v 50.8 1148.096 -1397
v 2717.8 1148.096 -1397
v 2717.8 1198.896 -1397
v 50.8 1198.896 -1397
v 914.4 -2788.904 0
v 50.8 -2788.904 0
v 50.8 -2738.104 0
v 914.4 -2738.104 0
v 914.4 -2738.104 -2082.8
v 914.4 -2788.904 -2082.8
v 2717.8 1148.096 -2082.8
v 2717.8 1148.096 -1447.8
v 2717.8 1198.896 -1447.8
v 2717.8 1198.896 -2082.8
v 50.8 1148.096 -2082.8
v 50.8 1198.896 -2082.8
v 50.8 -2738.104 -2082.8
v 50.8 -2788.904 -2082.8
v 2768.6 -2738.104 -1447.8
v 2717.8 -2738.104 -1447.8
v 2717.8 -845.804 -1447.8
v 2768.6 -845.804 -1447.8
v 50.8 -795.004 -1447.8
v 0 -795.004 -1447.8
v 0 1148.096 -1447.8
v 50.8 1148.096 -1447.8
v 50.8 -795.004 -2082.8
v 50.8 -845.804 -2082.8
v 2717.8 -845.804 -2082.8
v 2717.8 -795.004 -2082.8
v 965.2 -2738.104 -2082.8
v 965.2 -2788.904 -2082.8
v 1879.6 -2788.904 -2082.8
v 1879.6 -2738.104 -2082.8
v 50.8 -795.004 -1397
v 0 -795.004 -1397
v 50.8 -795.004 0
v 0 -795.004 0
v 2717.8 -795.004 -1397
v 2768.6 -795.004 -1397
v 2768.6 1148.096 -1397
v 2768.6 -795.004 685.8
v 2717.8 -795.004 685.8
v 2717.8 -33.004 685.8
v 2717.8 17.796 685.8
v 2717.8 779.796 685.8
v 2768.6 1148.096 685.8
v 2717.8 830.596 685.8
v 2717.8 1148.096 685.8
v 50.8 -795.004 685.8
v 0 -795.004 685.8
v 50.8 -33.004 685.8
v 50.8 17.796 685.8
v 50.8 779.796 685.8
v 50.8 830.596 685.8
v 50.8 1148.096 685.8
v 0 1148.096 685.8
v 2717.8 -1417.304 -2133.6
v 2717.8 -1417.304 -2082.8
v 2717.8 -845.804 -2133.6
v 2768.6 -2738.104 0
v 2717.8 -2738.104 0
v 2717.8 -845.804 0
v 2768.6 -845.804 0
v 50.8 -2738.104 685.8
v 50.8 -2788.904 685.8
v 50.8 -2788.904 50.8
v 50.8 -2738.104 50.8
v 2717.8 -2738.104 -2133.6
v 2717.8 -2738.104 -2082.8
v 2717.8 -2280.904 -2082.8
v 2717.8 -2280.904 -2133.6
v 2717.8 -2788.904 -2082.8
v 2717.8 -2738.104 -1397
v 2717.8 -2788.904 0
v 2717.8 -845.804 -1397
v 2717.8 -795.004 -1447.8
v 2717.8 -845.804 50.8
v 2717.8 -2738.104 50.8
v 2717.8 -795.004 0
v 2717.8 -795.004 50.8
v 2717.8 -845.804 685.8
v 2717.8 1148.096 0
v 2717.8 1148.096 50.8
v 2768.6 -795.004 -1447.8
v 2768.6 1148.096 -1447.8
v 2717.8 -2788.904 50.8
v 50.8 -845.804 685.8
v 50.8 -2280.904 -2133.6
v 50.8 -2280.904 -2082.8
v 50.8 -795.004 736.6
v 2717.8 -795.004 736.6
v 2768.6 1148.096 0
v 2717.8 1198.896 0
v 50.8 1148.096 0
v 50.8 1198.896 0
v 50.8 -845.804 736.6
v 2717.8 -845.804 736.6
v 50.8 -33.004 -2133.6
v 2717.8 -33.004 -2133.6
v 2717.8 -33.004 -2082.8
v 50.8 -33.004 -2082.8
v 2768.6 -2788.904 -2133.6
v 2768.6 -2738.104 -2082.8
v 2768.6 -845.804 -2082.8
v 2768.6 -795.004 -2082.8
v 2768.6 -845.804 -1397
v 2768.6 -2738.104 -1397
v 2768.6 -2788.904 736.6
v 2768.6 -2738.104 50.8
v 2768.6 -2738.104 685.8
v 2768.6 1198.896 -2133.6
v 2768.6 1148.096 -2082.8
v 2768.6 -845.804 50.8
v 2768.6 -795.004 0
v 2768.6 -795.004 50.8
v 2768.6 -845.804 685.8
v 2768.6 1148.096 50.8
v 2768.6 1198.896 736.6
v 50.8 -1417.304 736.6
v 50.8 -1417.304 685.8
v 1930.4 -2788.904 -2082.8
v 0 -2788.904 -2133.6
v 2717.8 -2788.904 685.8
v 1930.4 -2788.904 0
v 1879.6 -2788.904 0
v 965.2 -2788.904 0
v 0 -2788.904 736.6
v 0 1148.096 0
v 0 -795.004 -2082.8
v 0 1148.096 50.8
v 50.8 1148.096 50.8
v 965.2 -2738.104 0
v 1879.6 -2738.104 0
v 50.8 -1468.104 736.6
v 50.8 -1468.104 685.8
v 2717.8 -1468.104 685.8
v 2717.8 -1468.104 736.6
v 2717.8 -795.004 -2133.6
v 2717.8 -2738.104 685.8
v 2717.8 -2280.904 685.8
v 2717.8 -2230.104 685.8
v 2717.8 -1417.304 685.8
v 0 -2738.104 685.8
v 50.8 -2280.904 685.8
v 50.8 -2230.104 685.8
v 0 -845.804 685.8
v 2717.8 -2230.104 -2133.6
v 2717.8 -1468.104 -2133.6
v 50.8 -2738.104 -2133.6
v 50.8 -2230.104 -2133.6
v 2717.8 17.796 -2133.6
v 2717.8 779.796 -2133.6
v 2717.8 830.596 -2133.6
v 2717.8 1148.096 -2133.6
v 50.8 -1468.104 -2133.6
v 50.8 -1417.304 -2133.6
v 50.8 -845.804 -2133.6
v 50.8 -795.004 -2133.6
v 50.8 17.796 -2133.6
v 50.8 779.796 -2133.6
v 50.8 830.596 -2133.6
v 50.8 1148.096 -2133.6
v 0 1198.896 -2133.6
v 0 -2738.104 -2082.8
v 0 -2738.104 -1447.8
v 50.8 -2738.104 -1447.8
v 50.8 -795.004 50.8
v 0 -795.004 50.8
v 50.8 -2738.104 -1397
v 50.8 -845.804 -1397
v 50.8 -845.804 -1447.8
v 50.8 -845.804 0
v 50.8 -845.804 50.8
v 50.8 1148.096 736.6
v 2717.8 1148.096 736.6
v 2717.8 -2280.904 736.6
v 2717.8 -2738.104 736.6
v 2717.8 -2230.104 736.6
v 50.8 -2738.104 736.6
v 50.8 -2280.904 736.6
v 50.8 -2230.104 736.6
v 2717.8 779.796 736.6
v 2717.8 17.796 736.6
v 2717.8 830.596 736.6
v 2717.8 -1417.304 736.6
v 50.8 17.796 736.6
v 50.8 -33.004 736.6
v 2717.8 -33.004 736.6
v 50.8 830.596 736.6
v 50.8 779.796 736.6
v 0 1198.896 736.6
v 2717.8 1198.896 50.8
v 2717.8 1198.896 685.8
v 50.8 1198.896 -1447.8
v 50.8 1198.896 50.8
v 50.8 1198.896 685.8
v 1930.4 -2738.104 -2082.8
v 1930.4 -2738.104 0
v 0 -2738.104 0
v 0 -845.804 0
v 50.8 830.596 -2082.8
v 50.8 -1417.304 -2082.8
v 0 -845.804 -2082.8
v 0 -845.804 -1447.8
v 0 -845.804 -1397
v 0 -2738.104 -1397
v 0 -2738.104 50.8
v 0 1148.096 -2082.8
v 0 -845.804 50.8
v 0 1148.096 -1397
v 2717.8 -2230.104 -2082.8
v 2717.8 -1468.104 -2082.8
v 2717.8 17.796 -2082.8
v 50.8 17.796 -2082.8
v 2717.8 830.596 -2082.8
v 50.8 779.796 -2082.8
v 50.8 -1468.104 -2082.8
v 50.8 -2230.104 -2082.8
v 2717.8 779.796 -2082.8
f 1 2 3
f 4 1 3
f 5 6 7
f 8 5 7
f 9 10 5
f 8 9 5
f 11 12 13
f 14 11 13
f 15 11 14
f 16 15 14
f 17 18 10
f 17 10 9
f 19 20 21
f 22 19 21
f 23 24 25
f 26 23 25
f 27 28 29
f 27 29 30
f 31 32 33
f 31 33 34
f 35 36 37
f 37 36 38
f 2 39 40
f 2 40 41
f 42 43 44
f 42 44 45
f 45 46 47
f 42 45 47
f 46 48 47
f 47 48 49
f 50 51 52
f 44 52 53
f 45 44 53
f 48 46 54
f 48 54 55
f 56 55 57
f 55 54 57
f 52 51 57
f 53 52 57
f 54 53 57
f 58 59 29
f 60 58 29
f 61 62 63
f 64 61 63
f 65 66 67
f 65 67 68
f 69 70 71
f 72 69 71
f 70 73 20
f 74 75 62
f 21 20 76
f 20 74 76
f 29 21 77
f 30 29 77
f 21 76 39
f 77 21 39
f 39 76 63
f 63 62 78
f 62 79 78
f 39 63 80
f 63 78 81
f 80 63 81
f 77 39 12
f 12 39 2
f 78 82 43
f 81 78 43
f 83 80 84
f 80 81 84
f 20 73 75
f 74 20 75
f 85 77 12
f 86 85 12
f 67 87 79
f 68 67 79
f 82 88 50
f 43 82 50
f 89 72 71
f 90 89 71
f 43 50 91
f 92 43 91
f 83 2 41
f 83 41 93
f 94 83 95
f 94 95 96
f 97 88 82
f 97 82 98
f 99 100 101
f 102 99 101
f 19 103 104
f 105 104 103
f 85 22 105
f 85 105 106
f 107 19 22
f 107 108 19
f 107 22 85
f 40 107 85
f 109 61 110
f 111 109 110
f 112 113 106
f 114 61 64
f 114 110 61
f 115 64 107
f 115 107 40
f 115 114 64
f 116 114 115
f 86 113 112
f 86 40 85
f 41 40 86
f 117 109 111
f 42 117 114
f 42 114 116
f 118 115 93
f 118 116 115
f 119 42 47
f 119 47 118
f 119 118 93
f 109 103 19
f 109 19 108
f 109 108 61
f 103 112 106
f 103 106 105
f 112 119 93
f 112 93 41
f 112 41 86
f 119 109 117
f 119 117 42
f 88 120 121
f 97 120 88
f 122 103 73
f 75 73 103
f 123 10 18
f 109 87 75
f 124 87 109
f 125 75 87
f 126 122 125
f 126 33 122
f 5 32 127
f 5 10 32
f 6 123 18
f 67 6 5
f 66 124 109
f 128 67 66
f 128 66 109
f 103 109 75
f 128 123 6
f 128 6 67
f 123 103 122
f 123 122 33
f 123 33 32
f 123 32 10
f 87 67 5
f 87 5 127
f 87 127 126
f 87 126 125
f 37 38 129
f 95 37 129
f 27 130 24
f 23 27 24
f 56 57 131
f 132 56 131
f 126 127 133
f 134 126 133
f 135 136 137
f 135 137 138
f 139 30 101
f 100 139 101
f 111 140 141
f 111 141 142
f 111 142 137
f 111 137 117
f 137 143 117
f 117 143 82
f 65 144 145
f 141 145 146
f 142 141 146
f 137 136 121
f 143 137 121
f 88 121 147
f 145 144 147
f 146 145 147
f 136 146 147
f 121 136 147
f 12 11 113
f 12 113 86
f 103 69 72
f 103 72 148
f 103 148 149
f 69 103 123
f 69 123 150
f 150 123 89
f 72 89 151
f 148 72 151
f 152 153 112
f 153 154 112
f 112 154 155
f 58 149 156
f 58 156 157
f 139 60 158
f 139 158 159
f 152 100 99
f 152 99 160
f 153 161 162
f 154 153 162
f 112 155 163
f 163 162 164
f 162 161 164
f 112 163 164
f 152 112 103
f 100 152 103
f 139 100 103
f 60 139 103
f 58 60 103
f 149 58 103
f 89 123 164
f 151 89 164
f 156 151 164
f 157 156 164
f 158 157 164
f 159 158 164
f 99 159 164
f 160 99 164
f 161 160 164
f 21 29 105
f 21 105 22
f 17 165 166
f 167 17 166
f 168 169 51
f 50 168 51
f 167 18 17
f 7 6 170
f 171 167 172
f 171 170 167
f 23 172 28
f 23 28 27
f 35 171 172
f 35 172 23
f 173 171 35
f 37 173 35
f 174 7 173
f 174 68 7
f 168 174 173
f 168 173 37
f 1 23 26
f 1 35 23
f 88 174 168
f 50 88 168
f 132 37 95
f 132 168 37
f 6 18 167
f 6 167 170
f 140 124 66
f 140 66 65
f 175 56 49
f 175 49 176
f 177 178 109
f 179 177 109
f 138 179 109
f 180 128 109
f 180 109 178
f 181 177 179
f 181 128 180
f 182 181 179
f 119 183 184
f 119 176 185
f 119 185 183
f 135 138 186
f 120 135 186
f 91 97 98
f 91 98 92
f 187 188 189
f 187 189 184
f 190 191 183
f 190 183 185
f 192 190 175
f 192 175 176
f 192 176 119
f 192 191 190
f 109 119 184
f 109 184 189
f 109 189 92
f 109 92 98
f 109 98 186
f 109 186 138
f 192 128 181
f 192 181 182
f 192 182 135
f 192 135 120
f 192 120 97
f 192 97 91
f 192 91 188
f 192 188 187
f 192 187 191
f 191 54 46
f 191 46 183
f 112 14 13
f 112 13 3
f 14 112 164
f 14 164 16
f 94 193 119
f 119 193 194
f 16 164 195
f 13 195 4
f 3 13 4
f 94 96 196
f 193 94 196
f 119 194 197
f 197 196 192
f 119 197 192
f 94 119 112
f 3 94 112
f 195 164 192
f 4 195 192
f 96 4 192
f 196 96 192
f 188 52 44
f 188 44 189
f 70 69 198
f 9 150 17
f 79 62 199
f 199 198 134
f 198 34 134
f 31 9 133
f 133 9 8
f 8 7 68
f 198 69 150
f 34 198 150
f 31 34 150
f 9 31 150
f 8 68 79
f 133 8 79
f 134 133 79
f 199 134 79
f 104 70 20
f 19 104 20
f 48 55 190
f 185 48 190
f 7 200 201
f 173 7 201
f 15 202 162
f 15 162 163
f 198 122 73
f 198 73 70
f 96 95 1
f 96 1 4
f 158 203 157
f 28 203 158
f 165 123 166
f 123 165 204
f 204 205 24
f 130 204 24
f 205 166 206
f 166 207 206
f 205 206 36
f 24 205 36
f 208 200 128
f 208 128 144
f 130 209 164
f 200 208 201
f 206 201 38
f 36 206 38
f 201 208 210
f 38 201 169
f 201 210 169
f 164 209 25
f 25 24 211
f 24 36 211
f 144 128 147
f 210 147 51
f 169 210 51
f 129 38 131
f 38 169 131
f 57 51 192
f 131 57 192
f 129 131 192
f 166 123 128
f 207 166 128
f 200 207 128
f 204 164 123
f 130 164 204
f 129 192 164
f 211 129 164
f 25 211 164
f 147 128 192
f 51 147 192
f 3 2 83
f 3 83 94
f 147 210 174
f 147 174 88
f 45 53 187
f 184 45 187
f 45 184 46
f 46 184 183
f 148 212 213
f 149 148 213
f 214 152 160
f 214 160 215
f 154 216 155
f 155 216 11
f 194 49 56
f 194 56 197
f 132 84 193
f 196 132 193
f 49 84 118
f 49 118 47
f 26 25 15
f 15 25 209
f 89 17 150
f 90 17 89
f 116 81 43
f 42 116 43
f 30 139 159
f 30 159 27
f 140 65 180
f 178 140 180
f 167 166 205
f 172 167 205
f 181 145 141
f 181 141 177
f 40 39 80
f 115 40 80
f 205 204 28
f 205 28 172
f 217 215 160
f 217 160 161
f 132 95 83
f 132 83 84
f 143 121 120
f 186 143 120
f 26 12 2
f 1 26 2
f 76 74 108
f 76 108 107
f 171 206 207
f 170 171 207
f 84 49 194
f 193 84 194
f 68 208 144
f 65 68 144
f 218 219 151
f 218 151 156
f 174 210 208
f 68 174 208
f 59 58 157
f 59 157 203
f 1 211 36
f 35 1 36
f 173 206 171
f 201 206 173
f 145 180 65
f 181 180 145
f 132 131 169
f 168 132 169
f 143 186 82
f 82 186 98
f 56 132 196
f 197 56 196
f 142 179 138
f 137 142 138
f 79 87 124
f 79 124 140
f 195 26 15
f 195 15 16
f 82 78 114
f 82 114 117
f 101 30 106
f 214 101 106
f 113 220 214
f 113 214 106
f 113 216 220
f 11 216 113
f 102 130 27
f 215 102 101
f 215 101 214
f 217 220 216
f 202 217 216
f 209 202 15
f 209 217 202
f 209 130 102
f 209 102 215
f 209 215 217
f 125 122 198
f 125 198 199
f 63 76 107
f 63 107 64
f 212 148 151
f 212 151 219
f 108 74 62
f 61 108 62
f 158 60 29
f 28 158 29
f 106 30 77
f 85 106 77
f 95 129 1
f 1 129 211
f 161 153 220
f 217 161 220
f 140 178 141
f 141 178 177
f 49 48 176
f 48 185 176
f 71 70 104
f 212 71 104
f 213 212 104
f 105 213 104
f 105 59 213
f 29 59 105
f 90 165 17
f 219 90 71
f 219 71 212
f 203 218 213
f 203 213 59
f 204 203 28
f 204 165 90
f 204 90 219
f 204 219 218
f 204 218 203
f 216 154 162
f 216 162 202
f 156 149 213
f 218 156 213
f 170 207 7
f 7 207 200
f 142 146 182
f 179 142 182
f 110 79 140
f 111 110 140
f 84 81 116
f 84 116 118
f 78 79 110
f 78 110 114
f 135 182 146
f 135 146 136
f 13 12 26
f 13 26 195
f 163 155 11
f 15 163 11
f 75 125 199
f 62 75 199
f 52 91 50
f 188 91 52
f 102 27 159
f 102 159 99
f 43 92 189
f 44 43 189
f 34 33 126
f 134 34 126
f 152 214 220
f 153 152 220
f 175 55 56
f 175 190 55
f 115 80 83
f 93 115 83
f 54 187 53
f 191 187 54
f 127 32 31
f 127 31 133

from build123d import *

# Parameters (mm, degrees)
F0_W     = 50.8
F0_H     = 635
F0_H_2   = 1397
F1_DEPTH = 50.8
F2_W     = 50.8
F2_H     = 50.8
F3_DEPTH = 2667
F4_W     = 50.8
F4_H     = 2082.8
F5_DEPTH = 50.8
F6_W     = 3987.8
F6_H     = 2870.2
F6_W_2   = 1892.3
F6_H_2   = 635
F6_H_3   = 1397
F6_W_3   = 1943.1
F7_DEPTH = 50.8


with BuildPart() as f1:
    # F0 (on Right) → F1 (new body)
    with BuildSketch(Plane.YZ):
        Polygon((-2738.104361, 736.6), (-2788.904361, 736.6), (-2788.904361, -2133.6), (-2738.104361, -2133.6), (-2738.104361, -2082.8), (-2738.104361, -1447.8), (-2738.104361, -1397), (-2738.104361, 0), (-2738.104361, 50.8), (-2738.104361, 685.8), align=None)
        Polygon((1148.095639, 736.6), (-2738.104361, 736.6), (-2738.104361, 685.8), (-845.804361, 685.8), (-795.004361, 685.8), (1148.095639, 685.8), align=None)
        Polygon((1198.895639, 736.6), (1148.095639, 736.6), (1148.095639, 685.8), (1148.095639, 50.8), (1148.095639, 0), (1148.095639, -1397), (1148.095639, -1447.8), (1148.095639, -2082.8), (1148.095639, -2133.6), (1198.895639, -2133.6), align=None)
        Polygon((-2738.104361, -2082.8), (-2738.104361, -2133.6), (1148.095639, -2133.6), (1148.095639, -2082.8), (-795.004361, -2082.8), (-845.804361, -2082.8), align=None)
        Polygon((-845.804361, 50.8), (-2738.104361, 50.8), (-2738.104361, 0), (-845.804361, 0), (-795.004361, 0), (1148.095639, 0), (1148.095639, 50.8), (-795.004361, 50.8), align=None)
        with Locations((-820.404361, 368.3)):
            Rectangle(F0_W, F0_H)
        with Locations((-820.404361, -698.5)):
            Rectangle(F0_W, F0_H_2)
        with Locations((-820.404361, -1765.3)):
            Rectangle(F0_W, F0_H)
        Polygon((-2738.104361, -1397), (-2738.104361, -1447.8), (-845.804361, -1447.8), (-795.004361, -1447.8), (1148.095639, -1447.8), (1148.095639, -1397), (-795.004361, -1397), (-845.804361, -1397), align=None)
    extrude(amount=F1_DEPTH)

    # F2 (on face) → F3 (join)
    with BuildSketch(Plane.YZ.offset(50.8)):
        with Locations((-2763.504361, 711.2)):
            Rectangle(F2_W, F2_H)
        with Locations((-2763.504361, 25.4)):
            Rectangle(F2_W, F2_H)
        with Locations((-2763.504361, -2108.2)):
            Rectangle(F2_W, F2_H)
        with Locations((-820.404361, -2108.2)):
            Rectangle(F2_W, F2_H)
        with Locations((1173.495639, -2108.2)):
            Rectangle(F2_W, F2_H)
        with Locations((1173.495639, -1422.4)):
            Rectangle(F2_W, F2_H)
        with Locations((1173.495639, 25.4)):
            Rectangle(F2_W, F2_H)
        with Locations((1173.495639, 711.2)):
            Rectangle(F2_W, F2_H)
        with Locations((-820.404361, 711.2)):
            Rectangle(F2_W, F2_H)
        with Locations((-2255.504361, -2108.2)):
            Rectangle(F2_W, F2_H)
        with Locations((-1442.704361, -2108.2)):
            Rectangle(F2_W, F2_H)
        with Locations((-7.604361, -2108.2)):
            Rectangle(F2_W, F2_H)
        with Locations((805.195639, -2108.2)):
            Rectangle(F2_W, F2_H)
        with Locations((805.195639, 711.2)):
            Rectangle(F2_W, F2_H)
        with Locations((-7.604361, 711.2)):
            Rectangle(F2_W, F2_H)
        with Locations((-1442.704361, 711.2)):
            Rectangle(F2_W, F2_H)
        with Locations((-2255.504361, 711.2)):
            Rectangle(F2_W, F2_H)
    extrude(amount=F3_DEPTH)

    # F4 (on face) → F5 (join)
    with BuildSketch(Plane.XZ.offset(2788.904361)):
        with Locations((939.8, -1041.4)):
            Rectangle(F4_W, F4_H)
        with Locations((1905, -1041.4)):
            Rectangle(F4_W, F4_H)
    extrude(amount=-F5_DEPTH)

    # F6 (on face) → F7 (join)
    with BuildSketch(Plane.YZ.offset(2717.8)):
        with Locations((-795.004361, -698.5)):
            Rectangle(F6_W, F6_H)
        with Locations((-1791.954361, -1765.3)):
            Rectangle(F6_W_2, F6_H_2, mode=Mode.SUBTRACT)
        with Locations((-1791.954361, -698.5)):
            Rectangle(F6_W_2, F6_H_3, mode=Mode.SUBTRACT)
        with Locations((176.545639, -1765.3)):
            Rectangle(F6_W_3, F6_H_2, mode=Mode.SUBTRACT)
        with Locations((176.545639, -698.5)):
            Rectangle(F6_W_3, F6_H_3, mode=Mode.SUBTRACT)
        with Locations((-1791.954361, 368.3)):
            Rectangle(F6_W_2, F6_H_2, mode=Mode.SUBTRACT)
        with Locations((176.545639, 368.3)):
            Rectangle(F6_W_3, F6_H_2, mode=Mode.SUBTRACT)
    extrude(amount=F7_DEPTH)


solid = f1.part
